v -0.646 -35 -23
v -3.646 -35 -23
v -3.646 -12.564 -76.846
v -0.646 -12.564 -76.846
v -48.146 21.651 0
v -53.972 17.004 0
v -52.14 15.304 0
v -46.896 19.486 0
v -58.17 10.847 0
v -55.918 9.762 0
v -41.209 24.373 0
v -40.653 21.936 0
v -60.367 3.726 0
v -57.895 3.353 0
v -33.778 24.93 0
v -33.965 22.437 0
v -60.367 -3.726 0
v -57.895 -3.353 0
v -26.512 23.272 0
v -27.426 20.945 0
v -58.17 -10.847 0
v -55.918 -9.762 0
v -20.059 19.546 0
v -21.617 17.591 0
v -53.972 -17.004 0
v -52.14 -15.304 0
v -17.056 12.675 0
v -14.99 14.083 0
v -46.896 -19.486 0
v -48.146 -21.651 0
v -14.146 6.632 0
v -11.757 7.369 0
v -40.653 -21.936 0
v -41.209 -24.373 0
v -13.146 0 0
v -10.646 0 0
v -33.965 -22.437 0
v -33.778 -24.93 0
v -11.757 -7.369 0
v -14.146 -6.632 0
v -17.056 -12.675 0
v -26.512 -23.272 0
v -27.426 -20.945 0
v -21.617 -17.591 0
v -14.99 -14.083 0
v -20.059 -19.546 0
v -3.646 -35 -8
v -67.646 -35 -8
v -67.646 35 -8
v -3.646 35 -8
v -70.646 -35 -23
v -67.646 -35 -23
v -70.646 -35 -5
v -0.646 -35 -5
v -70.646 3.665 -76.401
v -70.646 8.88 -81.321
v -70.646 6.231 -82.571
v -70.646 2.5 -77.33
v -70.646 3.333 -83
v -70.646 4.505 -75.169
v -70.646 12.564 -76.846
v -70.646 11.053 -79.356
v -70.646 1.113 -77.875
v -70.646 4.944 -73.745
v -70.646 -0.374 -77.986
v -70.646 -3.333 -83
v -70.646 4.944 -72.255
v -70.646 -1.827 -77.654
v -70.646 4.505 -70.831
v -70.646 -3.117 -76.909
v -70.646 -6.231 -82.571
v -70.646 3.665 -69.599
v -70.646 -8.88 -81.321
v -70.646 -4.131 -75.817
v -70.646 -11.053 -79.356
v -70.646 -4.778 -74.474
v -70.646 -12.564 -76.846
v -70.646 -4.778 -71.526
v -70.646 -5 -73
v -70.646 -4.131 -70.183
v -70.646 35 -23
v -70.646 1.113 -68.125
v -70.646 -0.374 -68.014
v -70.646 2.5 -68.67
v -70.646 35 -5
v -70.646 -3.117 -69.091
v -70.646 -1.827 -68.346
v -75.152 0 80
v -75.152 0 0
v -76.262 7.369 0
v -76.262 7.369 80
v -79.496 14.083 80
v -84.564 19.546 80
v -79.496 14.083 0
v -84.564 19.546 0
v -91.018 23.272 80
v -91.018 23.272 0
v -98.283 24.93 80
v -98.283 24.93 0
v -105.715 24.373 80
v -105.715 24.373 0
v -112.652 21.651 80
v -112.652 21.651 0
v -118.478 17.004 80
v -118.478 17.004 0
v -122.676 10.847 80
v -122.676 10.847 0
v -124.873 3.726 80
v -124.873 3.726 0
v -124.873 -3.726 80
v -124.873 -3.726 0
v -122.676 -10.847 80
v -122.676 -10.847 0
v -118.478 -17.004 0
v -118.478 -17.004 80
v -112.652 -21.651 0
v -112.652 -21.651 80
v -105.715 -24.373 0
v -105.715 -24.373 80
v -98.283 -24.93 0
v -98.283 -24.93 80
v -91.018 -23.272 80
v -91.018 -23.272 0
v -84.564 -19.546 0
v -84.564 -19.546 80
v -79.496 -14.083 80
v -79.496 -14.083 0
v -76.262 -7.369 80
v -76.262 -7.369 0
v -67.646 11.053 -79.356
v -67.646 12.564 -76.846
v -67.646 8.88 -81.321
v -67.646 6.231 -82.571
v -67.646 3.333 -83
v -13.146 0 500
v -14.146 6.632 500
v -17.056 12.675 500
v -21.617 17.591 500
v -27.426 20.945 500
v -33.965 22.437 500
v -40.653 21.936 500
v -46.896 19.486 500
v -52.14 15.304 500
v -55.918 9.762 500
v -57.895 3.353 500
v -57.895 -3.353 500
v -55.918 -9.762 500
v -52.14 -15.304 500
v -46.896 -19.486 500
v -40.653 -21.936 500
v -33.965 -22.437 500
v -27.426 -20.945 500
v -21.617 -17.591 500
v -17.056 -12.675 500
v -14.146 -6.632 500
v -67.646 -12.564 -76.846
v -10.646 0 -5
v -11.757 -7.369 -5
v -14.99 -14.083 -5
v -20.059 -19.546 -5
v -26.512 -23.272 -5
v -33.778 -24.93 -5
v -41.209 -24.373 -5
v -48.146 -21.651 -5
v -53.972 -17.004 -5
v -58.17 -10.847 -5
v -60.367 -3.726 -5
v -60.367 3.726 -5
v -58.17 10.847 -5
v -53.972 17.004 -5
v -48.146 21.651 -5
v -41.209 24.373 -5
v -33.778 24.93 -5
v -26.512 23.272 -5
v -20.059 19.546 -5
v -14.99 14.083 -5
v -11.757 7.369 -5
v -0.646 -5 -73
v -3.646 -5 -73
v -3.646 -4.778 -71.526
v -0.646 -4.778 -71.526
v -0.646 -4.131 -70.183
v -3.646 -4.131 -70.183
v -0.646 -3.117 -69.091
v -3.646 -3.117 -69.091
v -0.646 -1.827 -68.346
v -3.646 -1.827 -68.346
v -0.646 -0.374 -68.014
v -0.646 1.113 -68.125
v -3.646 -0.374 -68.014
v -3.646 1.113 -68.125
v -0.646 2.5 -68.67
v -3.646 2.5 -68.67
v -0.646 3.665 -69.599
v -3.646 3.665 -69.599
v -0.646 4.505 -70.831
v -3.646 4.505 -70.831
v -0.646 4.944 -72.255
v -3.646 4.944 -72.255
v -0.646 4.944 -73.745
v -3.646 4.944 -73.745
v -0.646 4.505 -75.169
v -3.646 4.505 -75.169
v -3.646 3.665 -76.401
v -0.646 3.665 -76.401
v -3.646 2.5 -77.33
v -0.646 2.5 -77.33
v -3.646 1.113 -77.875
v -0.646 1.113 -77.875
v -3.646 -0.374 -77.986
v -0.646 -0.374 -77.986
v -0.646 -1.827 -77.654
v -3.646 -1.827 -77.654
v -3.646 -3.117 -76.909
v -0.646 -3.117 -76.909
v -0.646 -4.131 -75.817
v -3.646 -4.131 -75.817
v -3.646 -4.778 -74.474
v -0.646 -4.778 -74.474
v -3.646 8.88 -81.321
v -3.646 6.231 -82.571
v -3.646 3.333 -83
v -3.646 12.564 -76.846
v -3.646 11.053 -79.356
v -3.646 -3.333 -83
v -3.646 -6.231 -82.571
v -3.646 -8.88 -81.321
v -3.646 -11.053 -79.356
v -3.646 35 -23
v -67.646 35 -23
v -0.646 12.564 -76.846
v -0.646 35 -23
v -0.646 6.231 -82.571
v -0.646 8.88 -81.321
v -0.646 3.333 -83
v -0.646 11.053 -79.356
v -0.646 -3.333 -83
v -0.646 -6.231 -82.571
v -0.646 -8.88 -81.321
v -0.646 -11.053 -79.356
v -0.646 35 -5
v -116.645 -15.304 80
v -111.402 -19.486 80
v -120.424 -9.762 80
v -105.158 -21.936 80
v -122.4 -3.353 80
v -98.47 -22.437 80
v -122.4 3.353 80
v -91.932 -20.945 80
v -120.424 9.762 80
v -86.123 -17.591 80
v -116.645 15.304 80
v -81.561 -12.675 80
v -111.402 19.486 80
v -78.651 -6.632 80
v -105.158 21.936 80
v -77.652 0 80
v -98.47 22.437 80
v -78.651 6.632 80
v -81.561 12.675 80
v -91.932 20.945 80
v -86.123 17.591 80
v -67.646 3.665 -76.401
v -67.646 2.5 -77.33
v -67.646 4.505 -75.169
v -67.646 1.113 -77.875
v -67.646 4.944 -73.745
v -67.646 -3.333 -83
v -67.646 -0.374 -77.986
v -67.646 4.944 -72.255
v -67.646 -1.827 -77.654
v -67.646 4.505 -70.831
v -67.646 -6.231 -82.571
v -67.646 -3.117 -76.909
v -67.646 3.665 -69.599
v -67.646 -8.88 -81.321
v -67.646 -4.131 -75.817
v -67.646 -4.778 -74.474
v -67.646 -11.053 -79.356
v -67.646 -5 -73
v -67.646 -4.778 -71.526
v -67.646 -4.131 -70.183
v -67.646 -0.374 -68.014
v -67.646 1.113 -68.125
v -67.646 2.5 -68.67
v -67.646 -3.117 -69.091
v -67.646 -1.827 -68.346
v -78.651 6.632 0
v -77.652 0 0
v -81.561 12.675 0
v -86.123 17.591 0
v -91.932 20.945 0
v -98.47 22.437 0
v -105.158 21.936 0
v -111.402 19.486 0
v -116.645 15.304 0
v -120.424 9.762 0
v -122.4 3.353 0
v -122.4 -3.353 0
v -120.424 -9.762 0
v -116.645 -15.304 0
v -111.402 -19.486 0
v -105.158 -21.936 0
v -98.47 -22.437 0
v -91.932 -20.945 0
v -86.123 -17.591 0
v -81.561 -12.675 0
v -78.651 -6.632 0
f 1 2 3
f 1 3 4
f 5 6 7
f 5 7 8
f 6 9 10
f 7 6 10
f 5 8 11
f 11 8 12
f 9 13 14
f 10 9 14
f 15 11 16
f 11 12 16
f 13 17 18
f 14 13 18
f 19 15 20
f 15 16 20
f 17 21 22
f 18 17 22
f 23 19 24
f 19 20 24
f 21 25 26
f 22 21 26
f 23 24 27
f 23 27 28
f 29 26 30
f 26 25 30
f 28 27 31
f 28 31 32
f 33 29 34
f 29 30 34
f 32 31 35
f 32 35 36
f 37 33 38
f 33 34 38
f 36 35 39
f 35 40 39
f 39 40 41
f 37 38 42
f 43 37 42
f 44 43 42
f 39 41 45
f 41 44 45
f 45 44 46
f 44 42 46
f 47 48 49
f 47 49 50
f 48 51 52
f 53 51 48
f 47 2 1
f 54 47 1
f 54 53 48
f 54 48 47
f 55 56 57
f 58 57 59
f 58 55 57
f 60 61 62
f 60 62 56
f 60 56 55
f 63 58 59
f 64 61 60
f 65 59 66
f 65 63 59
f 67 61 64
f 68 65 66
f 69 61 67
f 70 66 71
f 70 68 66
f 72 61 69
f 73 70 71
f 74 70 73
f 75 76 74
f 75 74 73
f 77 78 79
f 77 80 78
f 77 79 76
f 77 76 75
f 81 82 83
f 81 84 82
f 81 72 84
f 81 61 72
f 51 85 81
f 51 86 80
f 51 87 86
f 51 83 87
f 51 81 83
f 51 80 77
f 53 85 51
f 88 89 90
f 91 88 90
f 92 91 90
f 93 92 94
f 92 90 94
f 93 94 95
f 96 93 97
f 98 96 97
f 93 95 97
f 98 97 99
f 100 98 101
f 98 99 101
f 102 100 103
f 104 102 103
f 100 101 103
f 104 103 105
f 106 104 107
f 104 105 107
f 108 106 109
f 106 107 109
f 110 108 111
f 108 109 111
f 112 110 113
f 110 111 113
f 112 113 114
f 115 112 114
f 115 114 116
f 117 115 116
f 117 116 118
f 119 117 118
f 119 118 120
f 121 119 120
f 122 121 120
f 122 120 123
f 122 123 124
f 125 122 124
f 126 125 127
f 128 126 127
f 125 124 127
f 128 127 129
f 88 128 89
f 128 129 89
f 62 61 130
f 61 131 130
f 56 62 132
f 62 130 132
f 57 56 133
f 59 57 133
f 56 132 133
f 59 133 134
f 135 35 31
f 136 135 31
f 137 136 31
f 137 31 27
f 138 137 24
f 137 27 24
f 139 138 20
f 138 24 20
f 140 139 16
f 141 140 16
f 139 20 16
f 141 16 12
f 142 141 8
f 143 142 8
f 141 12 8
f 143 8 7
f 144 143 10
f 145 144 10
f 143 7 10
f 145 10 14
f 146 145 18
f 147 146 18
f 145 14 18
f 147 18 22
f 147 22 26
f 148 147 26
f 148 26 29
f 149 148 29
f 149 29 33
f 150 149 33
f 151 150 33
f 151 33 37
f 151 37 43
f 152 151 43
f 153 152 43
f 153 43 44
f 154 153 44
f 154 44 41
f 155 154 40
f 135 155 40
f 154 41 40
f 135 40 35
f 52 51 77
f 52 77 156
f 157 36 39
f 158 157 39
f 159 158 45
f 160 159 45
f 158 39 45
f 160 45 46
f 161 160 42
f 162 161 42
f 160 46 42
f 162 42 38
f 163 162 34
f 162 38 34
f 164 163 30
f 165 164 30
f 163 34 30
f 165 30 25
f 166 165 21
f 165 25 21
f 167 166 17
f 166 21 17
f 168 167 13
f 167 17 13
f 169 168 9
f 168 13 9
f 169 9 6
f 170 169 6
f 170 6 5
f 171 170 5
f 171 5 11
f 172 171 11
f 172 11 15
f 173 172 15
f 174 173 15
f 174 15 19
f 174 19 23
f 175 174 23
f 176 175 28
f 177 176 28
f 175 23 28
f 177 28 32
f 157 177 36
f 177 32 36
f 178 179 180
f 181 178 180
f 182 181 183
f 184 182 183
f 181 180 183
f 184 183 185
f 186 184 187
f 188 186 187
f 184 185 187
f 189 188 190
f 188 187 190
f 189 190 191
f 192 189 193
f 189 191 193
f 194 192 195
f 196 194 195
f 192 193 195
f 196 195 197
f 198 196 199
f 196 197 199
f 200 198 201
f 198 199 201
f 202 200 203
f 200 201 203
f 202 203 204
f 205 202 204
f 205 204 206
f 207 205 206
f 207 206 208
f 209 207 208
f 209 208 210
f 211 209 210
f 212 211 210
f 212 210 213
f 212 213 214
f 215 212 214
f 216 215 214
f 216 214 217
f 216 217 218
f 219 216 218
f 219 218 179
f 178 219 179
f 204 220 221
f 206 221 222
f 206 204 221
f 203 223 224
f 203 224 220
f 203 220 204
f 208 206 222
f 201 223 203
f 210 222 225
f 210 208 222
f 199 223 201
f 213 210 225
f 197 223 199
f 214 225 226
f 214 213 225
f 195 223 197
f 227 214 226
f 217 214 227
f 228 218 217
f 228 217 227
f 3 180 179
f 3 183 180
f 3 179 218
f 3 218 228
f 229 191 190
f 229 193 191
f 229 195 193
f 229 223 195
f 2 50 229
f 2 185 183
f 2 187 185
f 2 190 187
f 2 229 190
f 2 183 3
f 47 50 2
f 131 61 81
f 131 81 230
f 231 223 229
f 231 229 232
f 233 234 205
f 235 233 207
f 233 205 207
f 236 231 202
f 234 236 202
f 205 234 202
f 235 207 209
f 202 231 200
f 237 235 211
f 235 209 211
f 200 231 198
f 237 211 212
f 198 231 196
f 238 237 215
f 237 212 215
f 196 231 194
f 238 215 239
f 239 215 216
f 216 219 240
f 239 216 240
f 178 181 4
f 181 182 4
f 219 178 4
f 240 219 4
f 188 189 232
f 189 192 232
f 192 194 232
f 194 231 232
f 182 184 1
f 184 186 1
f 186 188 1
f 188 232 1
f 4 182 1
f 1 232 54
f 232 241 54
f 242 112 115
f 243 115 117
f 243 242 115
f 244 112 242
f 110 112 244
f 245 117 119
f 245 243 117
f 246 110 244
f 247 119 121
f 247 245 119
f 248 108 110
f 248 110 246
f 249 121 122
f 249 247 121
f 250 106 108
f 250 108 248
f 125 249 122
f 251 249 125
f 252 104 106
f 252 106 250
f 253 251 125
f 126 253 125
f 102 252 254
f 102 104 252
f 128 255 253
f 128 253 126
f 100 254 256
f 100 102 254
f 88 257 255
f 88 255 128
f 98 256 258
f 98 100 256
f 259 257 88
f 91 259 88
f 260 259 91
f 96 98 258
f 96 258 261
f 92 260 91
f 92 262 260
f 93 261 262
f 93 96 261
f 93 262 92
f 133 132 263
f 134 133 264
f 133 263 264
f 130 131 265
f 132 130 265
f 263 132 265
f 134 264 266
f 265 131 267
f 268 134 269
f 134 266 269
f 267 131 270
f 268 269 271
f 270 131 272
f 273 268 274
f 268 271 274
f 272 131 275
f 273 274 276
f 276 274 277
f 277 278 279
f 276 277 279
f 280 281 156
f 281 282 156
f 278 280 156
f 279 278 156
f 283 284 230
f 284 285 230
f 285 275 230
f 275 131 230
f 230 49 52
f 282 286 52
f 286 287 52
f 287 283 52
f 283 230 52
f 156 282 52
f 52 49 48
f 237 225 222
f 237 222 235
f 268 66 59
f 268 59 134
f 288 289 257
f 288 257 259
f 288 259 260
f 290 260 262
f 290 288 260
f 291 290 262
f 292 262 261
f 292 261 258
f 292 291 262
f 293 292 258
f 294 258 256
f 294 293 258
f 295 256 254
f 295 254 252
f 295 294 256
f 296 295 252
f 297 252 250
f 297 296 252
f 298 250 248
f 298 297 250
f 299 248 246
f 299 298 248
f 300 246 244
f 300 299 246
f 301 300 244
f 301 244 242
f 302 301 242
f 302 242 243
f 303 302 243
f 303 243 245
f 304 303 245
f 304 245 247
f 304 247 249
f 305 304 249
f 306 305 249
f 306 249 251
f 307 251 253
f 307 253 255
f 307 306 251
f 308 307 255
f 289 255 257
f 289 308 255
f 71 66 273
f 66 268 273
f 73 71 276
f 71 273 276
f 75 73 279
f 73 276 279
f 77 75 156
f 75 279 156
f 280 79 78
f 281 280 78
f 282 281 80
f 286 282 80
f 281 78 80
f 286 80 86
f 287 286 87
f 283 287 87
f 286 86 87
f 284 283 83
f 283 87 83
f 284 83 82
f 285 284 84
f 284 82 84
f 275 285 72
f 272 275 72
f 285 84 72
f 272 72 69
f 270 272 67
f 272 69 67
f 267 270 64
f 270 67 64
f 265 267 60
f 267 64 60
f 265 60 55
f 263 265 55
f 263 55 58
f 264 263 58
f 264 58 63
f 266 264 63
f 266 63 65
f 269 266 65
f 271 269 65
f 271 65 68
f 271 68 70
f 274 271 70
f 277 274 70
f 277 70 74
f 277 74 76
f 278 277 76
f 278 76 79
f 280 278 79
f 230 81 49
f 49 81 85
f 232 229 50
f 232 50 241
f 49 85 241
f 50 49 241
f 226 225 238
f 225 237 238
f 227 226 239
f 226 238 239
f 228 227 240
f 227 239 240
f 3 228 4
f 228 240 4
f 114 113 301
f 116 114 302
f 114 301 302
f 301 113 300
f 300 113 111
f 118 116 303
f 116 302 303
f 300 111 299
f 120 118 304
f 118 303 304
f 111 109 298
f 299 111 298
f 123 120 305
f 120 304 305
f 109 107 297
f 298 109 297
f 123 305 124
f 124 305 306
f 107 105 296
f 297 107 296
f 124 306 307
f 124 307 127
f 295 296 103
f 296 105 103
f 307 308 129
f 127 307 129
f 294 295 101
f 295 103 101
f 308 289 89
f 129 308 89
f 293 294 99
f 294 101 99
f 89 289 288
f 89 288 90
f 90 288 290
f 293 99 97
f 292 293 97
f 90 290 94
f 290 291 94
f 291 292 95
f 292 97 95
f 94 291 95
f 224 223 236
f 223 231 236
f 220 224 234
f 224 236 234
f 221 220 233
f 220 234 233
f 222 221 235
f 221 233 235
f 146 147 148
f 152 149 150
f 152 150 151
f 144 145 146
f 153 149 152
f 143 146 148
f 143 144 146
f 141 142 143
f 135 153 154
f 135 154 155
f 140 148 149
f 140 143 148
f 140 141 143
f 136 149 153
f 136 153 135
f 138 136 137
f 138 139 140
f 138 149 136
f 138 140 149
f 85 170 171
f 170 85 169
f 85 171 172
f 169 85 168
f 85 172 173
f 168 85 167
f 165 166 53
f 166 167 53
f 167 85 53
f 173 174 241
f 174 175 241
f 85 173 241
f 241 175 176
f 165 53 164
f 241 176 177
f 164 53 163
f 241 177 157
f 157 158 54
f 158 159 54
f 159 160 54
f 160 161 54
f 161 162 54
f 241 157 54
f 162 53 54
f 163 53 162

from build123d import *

# Parameters (mm, degrees)
F0_R      = 25
F0_R_2    = 22.5
F1_DEPTH  = 80
F2_R      = 22.5
F3_DEPTH  = 500
F4_R      = 25
F5_DEPTH  = 5
F6_W      = 70
F6_H      = 70
F7_DEPTH  = 3
F8_W      = 3
F8_H      = 70
F9_DEPTH  = 75
F10_SIZE2 = 60
F10_SIZE  = 25
F11_SIZE2 = 60
F11_SIZE  = 25
F13_D     = 10
F14_R     = 10


with BuildPart() as f1:
    # F0 (on Top) → F1 (new body)
    with BuildSketch(Plane.XY):
        with Locations((-100.1517296412, 0)):
            Circle(F0_R)
        with Locations((-100.1517296412, 0)):
            Circle(F0_R_2, mode=Mode.SUBTRACT)
    extrude(amount=F1_DEPTH)


with BuildPart() as f3:
    # F2 (on Top) → F3 (new body)
    with BuildSketch(Plane.XY):
        with Locations((-35.6460149927, 0)):
            Circle(F2_R)
    extrude(amount=F3_DEPTH)

    # F4 (on face) → F5 (join)
    with BuildSketch(Plane(origin=(0, 0, 0), x_dir=(1, 0, 0), z_dir=(0, 0, -1))):
        with Locations((-35.6460149927, 0)):
            Circle(F4_R)
    extrude(amount=F5_DEPTH)

    # F6 (on face) → F7 (join)
    with BuildSketch(Plane(origin=(0, 0, -5), x_dir=(1, 0, 0), z_dir=(0, 0, -1))):
        with Locations((-35.6460149927, 0)):
            Rectangle(F6_W, F6_H)
    extrude(amount=F7_DEPTH)

    # F8 (on face) → F9 (join)
    with BuildSketch(Plane(origin=(0, 0, -8), x_dir=(1, 0, 0), z_dir=(0, 0, -1))):
        with Locations((-69.1460149927, 0)):
            Rectangle(F8_W, F8_H)
        with Locations((-2.1460149927, 0)):
            Rectangle(F8_W, F8_H)
    extrude(amount=F9_DEPTH)

    # F10
    f10_edges = [f3.edges().sort_by_distance(p)[0] for p in [
        (-69.146015, -35, -83),
        (-69.146015, 35, -83),
    ]]
    f10_side = f3.faces().sort_by_distance((-69.146015, 0, -83))[0]
    chamfer(f10_edges, length=F10_SIZE, length2=F10_SIZE2, reference=f10_side)

    # F11
    f11_edges = [f3.edges().sort_by_distance(p)[0] for p in [
        (-2.146015, 35, -83),
        (-2.146015, -35, -83),
    ]]
    f11_side = f3.faces().sort_by_distance((-2.146015, 0, -83))[0]
    chamfer(f11_edges, length=F11_SIZE, length2=F11_SIZE2, reference=f11_side)

    # F13 (through all)
    with Locations(Plane.YZ.offset(-0.6460149927)):
        with Locations((0, -73)):
            Hole(F13_D / 2)

    # F14
    f14_edges = [f3.edges().sort_by_distance(p)[0] for p in [
        (-2.146015, 10, -83),
        (-2.146015, -10, -83),
        (-69.146015, -10, -83),
        (-69.146015, 10, -83),
    ]]
    fillet(f14_edges, radius=F14_R)


solid = Compound([f1.part, f3.part])
